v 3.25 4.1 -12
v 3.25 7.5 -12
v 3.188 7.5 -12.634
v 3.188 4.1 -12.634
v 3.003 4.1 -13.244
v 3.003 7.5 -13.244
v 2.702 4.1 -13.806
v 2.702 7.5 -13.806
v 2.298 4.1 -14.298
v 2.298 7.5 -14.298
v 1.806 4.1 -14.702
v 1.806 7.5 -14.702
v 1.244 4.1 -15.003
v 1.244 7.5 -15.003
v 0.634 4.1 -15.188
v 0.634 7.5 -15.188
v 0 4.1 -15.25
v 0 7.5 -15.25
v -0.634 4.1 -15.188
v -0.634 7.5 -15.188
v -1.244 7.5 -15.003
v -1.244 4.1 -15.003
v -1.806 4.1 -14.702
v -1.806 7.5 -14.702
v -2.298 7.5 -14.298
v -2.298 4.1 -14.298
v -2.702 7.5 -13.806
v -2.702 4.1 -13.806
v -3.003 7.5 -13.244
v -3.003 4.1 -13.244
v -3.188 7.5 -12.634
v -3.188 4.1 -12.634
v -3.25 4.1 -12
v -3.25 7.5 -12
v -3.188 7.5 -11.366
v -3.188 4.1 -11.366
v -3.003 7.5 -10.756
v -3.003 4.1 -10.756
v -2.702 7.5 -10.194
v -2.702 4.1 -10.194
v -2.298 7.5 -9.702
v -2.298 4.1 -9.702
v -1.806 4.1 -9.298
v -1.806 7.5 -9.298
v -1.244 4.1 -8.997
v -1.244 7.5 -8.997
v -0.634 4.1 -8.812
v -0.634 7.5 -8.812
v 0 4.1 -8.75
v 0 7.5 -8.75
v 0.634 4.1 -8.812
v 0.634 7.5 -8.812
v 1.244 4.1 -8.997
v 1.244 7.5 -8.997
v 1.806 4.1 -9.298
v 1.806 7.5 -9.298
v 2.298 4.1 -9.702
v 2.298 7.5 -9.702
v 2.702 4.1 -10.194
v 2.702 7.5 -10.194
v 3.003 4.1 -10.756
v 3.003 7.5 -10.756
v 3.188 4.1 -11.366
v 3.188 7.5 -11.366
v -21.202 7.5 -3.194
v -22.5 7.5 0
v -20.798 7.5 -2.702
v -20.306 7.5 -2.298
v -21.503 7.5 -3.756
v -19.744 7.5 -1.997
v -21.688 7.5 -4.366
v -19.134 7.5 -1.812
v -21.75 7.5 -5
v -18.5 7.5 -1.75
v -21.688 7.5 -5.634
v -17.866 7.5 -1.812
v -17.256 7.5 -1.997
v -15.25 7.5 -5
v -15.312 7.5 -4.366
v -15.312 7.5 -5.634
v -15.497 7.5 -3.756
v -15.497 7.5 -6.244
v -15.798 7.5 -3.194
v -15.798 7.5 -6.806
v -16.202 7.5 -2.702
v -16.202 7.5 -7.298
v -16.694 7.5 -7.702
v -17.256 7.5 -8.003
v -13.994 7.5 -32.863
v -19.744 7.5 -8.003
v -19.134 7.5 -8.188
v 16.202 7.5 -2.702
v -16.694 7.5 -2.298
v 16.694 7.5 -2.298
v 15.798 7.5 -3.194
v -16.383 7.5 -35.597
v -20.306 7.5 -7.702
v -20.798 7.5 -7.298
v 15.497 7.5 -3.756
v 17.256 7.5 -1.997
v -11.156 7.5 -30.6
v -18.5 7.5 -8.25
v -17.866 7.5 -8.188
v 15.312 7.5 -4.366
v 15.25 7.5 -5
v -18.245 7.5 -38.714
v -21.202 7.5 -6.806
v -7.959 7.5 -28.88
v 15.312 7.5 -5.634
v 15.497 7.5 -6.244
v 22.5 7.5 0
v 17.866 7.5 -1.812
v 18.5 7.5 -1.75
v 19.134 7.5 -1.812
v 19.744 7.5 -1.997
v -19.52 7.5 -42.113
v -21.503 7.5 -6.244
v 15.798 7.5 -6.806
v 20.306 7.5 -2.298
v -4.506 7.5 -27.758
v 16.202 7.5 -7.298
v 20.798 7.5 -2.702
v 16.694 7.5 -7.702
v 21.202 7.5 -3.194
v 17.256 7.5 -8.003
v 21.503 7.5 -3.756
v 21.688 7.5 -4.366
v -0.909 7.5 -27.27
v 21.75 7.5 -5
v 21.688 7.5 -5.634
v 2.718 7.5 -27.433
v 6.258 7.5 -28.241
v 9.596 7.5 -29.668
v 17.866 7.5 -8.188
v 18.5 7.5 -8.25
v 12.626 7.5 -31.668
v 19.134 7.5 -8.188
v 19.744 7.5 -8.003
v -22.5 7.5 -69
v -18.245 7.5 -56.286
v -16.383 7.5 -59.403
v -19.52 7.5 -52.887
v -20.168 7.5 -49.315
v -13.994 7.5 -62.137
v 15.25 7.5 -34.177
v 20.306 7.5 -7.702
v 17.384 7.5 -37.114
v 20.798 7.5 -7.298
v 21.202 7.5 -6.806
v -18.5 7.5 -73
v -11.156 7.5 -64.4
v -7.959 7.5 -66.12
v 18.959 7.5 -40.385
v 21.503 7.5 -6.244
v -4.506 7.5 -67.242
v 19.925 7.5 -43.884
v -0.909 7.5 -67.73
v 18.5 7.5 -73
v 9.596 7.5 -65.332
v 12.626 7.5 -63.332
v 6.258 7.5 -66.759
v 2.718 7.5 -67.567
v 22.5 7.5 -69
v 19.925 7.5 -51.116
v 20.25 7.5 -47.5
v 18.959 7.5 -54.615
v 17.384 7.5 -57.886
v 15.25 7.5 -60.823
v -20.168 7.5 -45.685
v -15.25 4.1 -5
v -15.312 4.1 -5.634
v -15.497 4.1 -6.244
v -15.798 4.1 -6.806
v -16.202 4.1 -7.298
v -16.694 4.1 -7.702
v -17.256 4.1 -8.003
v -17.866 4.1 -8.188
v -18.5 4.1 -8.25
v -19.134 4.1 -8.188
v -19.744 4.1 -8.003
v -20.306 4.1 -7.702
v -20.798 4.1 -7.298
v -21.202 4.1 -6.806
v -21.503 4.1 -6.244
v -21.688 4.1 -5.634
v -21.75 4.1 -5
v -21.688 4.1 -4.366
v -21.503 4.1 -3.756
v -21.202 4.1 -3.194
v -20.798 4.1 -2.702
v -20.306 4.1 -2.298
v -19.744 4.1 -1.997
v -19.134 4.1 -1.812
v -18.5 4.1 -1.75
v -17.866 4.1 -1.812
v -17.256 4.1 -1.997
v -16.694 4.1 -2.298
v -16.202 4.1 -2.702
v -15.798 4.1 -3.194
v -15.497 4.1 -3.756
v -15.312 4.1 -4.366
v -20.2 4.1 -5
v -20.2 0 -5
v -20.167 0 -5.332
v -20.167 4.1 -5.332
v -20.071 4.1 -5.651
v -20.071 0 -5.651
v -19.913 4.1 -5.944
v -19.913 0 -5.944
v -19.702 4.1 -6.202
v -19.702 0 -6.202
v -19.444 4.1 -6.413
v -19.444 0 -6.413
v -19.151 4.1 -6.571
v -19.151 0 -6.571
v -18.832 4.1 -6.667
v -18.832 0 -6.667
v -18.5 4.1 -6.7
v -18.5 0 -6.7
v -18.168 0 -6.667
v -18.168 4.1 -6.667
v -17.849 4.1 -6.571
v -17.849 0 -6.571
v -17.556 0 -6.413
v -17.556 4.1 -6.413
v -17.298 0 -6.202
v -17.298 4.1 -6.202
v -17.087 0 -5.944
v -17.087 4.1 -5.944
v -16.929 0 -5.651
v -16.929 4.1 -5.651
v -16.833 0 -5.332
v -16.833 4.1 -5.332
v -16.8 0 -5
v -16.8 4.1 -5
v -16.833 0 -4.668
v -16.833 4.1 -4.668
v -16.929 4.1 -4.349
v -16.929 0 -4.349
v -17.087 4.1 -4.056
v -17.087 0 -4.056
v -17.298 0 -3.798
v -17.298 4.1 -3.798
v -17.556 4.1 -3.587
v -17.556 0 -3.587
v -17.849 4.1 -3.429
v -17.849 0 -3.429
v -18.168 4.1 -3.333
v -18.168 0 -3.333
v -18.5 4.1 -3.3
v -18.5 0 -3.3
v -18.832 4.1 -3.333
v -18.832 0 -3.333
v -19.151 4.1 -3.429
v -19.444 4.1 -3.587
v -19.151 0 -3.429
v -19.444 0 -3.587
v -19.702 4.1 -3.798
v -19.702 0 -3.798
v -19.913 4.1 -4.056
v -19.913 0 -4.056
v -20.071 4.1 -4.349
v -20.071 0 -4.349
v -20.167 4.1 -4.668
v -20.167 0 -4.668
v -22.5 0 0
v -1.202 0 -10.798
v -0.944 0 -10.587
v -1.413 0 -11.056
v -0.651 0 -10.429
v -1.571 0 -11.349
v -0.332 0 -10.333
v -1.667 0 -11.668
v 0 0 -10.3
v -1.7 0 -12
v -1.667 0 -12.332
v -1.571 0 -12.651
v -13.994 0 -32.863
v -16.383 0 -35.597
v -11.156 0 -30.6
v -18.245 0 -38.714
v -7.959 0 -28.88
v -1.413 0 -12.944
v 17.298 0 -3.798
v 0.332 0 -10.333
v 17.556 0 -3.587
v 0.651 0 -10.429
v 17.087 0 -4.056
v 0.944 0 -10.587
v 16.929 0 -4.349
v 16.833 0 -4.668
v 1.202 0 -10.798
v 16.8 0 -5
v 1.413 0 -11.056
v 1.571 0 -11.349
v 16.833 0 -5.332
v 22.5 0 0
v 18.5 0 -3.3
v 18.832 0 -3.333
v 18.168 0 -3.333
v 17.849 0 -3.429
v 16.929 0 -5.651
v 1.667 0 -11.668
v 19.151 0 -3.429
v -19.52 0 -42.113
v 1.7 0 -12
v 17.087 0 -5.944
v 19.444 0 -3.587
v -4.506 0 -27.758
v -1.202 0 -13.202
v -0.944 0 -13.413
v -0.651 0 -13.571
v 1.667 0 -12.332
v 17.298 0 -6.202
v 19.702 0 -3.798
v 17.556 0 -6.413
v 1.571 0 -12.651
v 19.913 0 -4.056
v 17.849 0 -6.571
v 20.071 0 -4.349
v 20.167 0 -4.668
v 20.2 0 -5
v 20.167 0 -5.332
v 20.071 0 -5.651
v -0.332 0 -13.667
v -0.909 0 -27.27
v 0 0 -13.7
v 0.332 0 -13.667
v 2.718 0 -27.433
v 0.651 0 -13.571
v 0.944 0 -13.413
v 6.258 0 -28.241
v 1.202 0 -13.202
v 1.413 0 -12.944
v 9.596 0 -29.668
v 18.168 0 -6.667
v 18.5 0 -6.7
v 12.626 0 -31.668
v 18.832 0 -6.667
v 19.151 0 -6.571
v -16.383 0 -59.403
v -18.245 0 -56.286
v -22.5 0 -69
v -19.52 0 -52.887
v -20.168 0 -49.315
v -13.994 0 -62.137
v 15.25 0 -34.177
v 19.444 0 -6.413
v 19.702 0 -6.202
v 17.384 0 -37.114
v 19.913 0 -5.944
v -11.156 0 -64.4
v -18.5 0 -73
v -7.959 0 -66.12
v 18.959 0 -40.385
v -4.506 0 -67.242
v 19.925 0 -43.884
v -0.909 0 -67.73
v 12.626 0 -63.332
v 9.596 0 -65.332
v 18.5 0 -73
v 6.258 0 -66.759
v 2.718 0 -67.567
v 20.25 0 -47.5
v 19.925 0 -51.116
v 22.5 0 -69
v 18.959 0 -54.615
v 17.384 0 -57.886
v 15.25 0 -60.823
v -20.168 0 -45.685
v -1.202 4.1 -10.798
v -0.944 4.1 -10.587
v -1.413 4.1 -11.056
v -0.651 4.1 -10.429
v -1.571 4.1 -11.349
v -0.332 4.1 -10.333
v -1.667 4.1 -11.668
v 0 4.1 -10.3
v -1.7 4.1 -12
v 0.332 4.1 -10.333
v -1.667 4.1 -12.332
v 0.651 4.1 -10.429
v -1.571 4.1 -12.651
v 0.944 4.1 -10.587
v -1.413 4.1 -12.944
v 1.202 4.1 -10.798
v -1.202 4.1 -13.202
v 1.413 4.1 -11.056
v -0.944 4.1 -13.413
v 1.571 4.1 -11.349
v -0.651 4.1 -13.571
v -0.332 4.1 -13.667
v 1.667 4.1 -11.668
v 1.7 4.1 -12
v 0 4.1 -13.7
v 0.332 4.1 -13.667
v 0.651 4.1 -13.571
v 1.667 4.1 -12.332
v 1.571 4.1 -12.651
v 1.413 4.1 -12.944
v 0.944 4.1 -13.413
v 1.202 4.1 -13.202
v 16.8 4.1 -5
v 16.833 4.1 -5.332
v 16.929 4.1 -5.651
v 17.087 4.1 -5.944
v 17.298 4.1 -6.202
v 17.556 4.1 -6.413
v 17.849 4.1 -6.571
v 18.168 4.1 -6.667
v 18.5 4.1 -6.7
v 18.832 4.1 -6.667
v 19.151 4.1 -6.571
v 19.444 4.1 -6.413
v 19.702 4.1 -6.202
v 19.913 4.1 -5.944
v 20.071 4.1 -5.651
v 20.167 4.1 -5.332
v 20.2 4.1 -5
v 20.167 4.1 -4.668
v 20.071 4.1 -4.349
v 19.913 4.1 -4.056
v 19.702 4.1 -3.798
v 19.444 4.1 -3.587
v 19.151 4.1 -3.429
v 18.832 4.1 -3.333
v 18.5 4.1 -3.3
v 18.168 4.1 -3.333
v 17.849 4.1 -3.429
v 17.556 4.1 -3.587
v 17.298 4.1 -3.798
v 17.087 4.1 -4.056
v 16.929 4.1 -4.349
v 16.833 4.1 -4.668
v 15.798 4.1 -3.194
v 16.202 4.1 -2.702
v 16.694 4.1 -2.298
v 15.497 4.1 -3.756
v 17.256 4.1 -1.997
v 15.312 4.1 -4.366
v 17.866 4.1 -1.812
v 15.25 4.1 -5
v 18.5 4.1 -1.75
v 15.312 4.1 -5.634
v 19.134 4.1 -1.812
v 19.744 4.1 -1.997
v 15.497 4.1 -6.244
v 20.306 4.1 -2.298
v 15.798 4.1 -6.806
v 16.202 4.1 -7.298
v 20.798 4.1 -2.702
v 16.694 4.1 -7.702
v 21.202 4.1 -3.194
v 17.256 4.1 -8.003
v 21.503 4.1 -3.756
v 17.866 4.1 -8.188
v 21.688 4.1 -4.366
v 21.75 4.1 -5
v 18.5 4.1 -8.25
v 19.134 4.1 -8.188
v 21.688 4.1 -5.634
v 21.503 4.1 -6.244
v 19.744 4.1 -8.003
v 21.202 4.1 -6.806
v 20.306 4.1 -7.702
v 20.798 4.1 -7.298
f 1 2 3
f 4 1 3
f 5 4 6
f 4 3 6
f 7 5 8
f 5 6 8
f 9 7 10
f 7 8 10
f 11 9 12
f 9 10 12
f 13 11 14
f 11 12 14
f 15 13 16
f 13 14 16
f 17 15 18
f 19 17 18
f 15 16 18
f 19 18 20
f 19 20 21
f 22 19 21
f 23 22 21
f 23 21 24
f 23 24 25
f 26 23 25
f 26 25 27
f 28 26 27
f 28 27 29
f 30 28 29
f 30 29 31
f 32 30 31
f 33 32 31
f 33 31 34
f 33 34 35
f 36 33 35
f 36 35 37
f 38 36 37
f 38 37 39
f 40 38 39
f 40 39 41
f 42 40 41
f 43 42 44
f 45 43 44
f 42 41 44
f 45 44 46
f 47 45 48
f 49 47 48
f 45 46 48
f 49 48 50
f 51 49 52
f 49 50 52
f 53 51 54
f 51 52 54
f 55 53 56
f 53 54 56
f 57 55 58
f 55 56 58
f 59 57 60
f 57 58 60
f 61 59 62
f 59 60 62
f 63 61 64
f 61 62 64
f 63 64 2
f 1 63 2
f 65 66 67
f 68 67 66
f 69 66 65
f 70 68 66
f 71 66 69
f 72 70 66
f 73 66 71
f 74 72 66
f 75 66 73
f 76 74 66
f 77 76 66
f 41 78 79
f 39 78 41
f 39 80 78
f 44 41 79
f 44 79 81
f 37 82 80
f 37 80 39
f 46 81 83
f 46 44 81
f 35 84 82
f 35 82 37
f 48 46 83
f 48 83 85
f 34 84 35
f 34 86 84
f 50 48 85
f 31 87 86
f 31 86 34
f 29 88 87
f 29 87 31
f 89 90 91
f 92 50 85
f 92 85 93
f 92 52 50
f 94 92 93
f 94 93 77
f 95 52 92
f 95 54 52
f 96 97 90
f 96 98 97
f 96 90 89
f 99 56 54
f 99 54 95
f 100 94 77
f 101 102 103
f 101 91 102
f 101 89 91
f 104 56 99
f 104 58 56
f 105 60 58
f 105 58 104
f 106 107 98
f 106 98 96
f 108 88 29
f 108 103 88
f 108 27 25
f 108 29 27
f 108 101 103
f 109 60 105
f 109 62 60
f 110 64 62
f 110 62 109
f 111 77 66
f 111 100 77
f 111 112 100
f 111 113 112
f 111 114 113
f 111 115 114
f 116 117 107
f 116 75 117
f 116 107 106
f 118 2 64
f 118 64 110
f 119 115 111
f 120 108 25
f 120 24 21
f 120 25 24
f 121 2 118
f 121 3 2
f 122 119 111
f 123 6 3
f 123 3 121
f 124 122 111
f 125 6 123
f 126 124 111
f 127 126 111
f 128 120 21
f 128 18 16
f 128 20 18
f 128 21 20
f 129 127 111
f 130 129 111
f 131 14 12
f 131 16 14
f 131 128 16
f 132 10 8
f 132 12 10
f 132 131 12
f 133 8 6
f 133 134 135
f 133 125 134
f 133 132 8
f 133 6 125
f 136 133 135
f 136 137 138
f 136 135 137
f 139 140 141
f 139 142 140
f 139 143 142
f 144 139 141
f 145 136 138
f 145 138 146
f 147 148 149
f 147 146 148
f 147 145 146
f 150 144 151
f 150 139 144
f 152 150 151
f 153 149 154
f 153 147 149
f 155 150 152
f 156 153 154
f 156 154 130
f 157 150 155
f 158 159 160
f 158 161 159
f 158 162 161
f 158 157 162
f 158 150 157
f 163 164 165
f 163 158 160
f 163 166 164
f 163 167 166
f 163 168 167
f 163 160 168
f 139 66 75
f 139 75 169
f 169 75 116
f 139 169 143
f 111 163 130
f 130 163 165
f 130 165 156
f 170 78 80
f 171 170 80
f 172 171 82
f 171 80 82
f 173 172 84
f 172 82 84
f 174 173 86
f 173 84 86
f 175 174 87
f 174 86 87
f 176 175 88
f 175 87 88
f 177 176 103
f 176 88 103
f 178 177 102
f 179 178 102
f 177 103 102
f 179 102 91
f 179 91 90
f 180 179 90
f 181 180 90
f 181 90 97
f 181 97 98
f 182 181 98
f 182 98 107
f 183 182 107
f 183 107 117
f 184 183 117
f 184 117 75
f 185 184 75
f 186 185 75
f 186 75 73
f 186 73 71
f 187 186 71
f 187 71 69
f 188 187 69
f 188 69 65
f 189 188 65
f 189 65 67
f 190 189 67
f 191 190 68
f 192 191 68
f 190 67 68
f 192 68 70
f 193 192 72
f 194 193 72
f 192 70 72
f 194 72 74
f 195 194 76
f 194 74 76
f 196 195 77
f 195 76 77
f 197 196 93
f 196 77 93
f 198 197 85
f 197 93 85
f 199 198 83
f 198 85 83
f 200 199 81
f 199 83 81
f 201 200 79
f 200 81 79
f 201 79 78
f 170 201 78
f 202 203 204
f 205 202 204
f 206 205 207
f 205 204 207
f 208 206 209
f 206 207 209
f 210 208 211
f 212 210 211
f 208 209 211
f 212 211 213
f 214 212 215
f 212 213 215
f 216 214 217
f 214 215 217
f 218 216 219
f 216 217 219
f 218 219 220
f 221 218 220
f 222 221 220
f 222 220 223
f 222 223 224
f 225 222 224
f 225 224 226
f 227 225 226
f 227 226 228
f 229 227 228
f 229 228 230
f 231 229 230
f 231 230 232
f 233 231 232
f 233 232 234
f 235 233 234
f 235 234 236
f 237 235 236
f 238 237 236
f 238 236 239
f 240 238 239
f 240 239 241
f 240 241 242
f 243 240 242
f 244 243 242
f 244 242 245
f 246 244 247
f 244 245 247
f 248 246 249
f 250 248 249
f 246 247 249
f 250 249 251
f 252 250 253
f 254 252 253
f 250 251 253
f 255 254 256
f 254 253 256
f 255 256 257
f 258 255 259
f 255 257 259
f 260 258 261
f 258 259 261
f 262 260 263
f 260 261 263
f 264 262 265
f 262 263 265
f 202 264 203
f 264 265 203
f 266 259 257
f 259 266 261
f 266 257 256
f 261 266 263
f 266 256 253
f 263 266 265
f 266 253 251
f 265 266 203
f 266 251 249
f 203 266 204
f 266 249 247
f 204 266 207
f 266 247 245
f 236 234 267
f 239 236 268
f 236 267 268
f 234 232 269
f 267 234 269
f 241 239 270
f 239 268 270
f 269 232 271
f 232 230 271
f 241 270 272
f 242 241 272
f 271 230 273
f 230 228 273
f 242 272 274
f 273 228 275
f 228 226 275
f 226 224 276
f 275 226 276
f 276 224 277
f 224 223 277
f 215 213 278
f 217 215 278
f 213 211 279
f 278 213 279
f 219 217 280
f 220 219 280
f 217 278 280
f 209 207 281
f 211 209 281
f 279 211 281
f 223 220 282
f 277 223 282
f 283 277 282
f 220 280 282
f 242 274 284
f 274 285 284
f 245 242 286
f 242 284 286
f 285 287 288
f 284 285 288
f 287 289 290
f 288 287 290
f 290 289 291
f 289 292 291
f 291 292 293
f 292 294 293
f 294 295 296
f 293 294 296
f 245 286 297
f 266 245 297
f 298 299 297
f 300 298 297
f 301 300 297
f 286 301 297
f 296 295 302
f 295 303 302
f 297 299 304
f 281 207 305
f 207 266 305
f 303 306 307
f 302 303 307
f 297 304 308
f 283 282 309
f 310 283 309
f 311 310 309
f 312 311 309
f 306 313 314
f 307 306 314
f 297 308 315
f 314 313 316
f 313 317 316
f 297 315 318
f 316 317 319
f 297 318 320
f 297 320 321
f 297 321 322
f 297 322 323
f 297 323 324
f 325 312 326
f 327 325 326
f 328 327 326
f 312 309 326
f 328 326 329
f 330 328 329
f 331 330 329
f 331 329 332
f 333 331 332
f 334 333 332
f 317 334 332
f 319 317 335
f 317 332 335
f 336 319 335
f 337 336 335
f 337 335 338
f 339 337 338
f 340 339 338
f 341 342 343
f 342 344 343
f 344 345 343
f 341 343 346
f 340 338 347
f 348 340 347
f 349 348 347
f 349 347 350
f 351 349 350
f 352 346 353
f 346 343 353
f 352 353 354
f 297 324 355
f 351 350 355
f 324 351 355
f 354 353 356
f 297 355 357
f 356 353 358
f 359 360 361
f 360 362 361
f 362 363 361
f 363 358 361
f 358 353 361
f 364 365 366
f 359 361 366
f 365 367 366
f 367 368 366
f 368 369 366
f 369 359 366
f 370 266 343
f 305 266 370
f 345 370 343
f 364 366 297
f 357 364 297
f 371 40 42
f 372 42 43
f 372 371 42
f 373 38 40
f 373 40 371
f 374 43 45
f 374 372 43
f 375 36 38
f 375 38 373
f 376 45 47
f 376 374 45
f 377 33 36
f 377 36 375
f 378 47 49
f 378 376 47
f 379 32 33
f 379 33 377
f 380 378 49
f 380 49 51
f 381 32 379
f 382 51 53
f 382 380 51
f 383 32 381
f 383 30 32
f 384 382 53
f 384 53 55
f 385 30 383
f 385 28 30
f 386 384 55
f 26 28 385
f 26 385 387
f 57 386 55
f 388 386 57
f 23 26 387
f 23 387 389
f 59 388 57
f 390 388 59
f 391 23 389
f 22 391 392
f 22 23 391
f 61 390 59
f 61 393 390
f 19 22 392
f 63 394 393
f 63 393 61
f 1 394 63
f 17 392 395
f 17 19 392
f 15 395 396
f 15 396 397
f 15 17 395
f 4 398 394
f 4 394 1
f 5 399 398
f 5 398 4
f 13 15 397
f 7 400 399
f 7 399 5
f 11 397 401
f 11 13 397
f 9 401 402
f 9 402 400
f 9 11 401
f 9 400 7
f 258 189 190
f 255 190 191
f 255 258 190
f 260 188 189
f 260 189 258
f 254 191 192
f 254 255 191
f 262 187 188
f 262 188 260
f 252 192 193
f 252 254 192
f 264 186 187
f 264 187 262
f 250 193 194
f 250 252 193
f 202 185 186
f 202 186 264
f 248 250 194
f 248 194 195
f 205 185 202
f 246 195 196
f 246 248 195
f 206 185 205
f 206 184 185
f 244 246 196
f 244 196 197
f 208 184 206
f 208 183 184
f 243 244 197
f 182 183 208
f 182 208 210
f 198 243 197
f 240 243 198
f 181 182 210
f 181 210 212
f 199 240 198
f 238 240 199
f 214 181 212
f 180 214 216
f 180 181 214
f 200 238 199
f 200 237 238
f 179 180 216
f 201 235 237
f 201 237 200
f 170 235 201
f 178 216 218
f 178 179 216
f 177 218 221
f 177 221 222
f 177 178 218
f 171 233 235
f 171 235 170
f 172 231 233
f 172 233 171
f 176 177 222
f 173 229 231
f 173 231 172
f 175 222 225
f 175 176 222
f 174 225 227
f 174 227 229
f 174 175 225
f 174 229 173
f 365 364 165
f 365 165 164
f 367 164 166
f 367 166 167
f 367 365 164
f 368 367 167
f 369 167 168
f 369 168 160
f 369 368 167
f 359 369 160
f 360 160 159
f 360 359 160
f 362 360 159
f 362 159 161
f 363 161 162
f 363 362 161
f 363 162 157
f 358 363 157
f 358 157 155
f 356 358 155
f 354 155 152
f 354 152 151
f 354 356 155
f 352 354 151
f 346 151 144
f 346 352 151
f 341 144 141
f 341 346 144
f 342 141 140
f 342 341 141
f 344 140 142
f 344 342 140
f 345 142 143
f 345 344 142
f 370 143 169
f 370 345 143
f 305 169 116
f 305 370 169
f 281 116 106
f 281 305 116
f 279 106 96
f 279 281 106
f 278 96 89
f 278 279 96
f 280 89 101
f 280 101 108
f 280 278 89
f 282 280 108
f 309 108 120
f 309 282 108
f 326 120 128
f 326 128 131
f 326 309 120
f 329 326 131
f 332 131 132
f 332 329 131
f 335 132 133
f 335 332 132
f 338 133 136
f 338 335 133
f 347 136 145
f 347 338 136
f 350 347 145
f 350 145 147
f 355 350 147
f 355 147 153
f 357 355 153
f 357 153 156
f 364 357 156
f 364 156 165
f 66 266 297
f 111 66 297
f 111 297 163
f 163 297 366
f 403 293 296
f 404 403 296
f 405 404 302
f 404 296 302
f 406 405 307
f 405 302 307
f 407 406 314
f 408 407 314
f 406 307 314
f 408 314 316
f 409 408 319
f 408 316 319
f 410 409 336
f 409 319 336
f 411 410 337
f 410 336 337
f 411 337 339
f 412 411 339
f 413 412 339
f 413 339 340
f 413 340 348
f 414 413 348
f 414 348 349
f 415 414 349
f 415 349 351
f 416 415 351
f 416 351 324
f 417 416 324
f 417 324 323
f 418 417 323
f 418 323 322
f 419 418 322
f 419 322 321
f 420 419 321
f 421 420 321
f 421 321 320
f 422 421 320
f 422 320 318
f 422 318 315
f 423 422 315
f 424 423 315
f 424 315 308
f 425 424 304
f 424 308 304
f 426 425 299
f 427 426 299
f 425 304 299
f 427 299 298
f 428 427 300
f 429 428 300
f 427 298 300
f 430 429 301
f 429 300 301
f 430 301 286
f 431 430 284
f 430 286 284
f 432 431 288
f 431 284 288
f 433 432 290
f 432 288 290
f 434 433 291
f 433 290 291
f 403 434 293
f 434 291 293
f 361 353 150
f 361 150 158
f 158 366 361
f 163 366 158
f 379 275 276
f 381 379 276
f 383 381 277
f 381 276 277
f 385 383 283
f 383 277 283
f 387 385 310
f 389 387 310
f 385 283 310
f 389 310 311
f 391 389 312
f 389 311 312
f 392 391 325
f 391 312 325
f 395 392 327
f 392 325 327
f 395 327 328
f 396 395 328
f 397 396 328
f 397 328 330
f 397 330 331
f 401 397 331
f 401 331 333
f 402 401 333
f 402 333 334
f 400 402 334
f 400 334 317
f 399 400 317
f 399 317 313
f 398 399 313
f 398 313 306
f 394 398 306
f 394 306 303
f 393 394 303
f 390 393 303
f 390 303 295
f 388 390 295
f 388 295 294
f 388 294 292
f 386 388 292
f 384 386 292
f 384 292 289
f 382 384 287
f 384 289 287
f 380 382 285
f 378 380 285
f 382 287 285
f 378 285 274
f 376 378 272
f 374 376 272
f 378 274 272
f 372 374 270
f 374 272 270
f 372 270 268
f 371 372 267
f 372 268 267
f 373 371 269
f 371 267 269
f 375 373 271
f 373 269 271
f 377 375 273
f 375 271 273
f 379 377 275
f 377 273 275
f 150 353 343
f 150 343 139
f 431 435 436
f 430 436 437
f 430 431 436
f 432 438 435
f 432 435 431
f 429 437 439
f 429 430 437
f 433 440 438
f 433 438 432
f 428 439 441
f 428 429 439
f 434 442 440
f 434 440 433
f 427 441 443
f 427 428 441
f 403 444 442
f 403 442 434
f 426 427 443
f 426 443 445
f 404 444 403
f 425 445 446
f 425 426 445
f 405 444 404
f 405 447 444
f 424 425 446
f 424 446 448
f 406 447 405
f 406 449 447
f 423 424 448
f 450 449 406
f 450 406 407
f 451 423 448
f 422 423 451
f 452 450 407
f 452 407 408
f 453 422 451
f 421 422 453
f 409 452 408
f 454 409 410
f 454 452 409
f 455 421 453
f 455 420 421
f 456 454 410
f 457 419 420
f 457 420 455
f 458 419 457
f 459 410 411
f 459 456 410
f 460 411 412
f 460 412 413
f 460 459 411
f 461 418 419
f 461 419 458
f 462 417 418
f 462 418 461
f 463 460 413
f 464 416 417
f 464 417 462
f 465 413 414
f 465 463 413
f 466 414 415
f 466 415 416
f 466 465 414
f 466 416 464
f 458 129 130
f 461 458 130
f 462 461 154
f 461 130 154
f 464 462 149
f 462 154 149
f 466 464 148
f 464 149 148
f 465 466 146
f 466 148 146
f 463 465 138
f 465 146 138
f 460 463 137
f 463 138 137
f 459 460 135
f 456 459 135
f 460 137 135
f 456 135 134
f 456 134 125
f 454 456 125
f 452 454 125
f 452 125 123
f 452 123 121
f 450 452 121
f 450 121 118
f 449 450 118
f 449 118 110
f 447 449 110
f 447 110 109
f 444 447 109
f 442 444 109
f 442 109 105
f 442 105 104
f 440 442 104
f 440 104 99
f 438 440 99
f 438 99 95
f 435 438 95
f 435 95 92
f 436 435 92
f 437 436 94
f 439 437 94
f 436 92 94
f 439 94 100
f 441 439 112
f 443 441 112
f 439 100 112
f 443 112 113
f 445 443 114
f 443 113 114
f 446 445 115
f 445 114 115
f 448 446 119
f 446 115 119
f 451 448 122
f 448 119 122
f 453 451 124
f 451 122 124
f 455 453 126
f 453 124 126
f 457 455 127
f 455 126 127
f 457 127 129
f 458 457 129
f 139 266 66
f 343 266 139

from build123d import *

# Parameters (mm, degrees)
SKETCH1_W                                           = 45
SKETCH1_H                                           = 73
SKETCH1_R                                           = 20.25
BOSS_EXTRUDE1_DEPTH                                 = 7.5
CHAMFER1_SIZE                                       = 4
CBORE_FOR_M3_HEX_SOCKET_HEAD_CAP_SCREW1_D           = 3.4
CBORE_FOR_M3_HEX_SOCKET_HEAD_CAP_SCREW1_DEPTH       = 7.5
CBORE_FOR_M3_HEX_SOCKET_HEAD_CAP_SCREW1_CBORE_D     = 6.5
CBORE_FOR_M3_HEX_SOCKET_HEAD_CAP_SCREW1_CBORE_DEPTH = 3.4


with BuildPart() as part:
    # Sketch1 → Boss-Extrude1 (new body)
    with BuildSketch(Plane(origin=(0, 0, 0), x_dir=(1, 0, 0), z_dir=(0, 1, 0))):
        with Locations((0, 36.5)):
            Rectangle(SKETCH1_W, SKETCH1_H)
        with Locations((0, 47.5)):
            Circle(SKETCH1_R, mode=Mode.SUBTRACT)
    extrude(amount=BOSS_EXTRUDE1_DEPTH)

    # Chamfer1
    chamfer1_edges = [part.edges().sort_by_distance(p)[0] for p in [
        (-22.5, 3.75, -73),
        (22.5, 3.75, -73),
    ]]
    chamfer(chamfer1_edges, length=CHAMFER1_SIZE)

    # CBORE for M3 Hex Socket Head Cap Screw1
    with Locations(Plane(origin=(0, 7.5, 0), x_dir=(1, 0, 0), z_dir=(0, 1, 0))):
        with Locations((-18.5, 5), (0, 12), (18.5, 5)):
            CounterBoreHole(CBORE_FOR_M3_HEX_SOCKET_HEAD_CAP_SCREW1_D / 2, CBORE_FOR_M3_HEX_SOCKET_HEAD_CAP_SCREW1_CBORE_D / 2, CBORE_FOR_M3_HEX_SOCKET_HEAD_CAP_SCREW1_CBORE_DEPTH, depth=CBORE_FOR_M3_HEX_SOCKET_HEAD_CAP_SCREW1_DEPTH)


solid = part.part
